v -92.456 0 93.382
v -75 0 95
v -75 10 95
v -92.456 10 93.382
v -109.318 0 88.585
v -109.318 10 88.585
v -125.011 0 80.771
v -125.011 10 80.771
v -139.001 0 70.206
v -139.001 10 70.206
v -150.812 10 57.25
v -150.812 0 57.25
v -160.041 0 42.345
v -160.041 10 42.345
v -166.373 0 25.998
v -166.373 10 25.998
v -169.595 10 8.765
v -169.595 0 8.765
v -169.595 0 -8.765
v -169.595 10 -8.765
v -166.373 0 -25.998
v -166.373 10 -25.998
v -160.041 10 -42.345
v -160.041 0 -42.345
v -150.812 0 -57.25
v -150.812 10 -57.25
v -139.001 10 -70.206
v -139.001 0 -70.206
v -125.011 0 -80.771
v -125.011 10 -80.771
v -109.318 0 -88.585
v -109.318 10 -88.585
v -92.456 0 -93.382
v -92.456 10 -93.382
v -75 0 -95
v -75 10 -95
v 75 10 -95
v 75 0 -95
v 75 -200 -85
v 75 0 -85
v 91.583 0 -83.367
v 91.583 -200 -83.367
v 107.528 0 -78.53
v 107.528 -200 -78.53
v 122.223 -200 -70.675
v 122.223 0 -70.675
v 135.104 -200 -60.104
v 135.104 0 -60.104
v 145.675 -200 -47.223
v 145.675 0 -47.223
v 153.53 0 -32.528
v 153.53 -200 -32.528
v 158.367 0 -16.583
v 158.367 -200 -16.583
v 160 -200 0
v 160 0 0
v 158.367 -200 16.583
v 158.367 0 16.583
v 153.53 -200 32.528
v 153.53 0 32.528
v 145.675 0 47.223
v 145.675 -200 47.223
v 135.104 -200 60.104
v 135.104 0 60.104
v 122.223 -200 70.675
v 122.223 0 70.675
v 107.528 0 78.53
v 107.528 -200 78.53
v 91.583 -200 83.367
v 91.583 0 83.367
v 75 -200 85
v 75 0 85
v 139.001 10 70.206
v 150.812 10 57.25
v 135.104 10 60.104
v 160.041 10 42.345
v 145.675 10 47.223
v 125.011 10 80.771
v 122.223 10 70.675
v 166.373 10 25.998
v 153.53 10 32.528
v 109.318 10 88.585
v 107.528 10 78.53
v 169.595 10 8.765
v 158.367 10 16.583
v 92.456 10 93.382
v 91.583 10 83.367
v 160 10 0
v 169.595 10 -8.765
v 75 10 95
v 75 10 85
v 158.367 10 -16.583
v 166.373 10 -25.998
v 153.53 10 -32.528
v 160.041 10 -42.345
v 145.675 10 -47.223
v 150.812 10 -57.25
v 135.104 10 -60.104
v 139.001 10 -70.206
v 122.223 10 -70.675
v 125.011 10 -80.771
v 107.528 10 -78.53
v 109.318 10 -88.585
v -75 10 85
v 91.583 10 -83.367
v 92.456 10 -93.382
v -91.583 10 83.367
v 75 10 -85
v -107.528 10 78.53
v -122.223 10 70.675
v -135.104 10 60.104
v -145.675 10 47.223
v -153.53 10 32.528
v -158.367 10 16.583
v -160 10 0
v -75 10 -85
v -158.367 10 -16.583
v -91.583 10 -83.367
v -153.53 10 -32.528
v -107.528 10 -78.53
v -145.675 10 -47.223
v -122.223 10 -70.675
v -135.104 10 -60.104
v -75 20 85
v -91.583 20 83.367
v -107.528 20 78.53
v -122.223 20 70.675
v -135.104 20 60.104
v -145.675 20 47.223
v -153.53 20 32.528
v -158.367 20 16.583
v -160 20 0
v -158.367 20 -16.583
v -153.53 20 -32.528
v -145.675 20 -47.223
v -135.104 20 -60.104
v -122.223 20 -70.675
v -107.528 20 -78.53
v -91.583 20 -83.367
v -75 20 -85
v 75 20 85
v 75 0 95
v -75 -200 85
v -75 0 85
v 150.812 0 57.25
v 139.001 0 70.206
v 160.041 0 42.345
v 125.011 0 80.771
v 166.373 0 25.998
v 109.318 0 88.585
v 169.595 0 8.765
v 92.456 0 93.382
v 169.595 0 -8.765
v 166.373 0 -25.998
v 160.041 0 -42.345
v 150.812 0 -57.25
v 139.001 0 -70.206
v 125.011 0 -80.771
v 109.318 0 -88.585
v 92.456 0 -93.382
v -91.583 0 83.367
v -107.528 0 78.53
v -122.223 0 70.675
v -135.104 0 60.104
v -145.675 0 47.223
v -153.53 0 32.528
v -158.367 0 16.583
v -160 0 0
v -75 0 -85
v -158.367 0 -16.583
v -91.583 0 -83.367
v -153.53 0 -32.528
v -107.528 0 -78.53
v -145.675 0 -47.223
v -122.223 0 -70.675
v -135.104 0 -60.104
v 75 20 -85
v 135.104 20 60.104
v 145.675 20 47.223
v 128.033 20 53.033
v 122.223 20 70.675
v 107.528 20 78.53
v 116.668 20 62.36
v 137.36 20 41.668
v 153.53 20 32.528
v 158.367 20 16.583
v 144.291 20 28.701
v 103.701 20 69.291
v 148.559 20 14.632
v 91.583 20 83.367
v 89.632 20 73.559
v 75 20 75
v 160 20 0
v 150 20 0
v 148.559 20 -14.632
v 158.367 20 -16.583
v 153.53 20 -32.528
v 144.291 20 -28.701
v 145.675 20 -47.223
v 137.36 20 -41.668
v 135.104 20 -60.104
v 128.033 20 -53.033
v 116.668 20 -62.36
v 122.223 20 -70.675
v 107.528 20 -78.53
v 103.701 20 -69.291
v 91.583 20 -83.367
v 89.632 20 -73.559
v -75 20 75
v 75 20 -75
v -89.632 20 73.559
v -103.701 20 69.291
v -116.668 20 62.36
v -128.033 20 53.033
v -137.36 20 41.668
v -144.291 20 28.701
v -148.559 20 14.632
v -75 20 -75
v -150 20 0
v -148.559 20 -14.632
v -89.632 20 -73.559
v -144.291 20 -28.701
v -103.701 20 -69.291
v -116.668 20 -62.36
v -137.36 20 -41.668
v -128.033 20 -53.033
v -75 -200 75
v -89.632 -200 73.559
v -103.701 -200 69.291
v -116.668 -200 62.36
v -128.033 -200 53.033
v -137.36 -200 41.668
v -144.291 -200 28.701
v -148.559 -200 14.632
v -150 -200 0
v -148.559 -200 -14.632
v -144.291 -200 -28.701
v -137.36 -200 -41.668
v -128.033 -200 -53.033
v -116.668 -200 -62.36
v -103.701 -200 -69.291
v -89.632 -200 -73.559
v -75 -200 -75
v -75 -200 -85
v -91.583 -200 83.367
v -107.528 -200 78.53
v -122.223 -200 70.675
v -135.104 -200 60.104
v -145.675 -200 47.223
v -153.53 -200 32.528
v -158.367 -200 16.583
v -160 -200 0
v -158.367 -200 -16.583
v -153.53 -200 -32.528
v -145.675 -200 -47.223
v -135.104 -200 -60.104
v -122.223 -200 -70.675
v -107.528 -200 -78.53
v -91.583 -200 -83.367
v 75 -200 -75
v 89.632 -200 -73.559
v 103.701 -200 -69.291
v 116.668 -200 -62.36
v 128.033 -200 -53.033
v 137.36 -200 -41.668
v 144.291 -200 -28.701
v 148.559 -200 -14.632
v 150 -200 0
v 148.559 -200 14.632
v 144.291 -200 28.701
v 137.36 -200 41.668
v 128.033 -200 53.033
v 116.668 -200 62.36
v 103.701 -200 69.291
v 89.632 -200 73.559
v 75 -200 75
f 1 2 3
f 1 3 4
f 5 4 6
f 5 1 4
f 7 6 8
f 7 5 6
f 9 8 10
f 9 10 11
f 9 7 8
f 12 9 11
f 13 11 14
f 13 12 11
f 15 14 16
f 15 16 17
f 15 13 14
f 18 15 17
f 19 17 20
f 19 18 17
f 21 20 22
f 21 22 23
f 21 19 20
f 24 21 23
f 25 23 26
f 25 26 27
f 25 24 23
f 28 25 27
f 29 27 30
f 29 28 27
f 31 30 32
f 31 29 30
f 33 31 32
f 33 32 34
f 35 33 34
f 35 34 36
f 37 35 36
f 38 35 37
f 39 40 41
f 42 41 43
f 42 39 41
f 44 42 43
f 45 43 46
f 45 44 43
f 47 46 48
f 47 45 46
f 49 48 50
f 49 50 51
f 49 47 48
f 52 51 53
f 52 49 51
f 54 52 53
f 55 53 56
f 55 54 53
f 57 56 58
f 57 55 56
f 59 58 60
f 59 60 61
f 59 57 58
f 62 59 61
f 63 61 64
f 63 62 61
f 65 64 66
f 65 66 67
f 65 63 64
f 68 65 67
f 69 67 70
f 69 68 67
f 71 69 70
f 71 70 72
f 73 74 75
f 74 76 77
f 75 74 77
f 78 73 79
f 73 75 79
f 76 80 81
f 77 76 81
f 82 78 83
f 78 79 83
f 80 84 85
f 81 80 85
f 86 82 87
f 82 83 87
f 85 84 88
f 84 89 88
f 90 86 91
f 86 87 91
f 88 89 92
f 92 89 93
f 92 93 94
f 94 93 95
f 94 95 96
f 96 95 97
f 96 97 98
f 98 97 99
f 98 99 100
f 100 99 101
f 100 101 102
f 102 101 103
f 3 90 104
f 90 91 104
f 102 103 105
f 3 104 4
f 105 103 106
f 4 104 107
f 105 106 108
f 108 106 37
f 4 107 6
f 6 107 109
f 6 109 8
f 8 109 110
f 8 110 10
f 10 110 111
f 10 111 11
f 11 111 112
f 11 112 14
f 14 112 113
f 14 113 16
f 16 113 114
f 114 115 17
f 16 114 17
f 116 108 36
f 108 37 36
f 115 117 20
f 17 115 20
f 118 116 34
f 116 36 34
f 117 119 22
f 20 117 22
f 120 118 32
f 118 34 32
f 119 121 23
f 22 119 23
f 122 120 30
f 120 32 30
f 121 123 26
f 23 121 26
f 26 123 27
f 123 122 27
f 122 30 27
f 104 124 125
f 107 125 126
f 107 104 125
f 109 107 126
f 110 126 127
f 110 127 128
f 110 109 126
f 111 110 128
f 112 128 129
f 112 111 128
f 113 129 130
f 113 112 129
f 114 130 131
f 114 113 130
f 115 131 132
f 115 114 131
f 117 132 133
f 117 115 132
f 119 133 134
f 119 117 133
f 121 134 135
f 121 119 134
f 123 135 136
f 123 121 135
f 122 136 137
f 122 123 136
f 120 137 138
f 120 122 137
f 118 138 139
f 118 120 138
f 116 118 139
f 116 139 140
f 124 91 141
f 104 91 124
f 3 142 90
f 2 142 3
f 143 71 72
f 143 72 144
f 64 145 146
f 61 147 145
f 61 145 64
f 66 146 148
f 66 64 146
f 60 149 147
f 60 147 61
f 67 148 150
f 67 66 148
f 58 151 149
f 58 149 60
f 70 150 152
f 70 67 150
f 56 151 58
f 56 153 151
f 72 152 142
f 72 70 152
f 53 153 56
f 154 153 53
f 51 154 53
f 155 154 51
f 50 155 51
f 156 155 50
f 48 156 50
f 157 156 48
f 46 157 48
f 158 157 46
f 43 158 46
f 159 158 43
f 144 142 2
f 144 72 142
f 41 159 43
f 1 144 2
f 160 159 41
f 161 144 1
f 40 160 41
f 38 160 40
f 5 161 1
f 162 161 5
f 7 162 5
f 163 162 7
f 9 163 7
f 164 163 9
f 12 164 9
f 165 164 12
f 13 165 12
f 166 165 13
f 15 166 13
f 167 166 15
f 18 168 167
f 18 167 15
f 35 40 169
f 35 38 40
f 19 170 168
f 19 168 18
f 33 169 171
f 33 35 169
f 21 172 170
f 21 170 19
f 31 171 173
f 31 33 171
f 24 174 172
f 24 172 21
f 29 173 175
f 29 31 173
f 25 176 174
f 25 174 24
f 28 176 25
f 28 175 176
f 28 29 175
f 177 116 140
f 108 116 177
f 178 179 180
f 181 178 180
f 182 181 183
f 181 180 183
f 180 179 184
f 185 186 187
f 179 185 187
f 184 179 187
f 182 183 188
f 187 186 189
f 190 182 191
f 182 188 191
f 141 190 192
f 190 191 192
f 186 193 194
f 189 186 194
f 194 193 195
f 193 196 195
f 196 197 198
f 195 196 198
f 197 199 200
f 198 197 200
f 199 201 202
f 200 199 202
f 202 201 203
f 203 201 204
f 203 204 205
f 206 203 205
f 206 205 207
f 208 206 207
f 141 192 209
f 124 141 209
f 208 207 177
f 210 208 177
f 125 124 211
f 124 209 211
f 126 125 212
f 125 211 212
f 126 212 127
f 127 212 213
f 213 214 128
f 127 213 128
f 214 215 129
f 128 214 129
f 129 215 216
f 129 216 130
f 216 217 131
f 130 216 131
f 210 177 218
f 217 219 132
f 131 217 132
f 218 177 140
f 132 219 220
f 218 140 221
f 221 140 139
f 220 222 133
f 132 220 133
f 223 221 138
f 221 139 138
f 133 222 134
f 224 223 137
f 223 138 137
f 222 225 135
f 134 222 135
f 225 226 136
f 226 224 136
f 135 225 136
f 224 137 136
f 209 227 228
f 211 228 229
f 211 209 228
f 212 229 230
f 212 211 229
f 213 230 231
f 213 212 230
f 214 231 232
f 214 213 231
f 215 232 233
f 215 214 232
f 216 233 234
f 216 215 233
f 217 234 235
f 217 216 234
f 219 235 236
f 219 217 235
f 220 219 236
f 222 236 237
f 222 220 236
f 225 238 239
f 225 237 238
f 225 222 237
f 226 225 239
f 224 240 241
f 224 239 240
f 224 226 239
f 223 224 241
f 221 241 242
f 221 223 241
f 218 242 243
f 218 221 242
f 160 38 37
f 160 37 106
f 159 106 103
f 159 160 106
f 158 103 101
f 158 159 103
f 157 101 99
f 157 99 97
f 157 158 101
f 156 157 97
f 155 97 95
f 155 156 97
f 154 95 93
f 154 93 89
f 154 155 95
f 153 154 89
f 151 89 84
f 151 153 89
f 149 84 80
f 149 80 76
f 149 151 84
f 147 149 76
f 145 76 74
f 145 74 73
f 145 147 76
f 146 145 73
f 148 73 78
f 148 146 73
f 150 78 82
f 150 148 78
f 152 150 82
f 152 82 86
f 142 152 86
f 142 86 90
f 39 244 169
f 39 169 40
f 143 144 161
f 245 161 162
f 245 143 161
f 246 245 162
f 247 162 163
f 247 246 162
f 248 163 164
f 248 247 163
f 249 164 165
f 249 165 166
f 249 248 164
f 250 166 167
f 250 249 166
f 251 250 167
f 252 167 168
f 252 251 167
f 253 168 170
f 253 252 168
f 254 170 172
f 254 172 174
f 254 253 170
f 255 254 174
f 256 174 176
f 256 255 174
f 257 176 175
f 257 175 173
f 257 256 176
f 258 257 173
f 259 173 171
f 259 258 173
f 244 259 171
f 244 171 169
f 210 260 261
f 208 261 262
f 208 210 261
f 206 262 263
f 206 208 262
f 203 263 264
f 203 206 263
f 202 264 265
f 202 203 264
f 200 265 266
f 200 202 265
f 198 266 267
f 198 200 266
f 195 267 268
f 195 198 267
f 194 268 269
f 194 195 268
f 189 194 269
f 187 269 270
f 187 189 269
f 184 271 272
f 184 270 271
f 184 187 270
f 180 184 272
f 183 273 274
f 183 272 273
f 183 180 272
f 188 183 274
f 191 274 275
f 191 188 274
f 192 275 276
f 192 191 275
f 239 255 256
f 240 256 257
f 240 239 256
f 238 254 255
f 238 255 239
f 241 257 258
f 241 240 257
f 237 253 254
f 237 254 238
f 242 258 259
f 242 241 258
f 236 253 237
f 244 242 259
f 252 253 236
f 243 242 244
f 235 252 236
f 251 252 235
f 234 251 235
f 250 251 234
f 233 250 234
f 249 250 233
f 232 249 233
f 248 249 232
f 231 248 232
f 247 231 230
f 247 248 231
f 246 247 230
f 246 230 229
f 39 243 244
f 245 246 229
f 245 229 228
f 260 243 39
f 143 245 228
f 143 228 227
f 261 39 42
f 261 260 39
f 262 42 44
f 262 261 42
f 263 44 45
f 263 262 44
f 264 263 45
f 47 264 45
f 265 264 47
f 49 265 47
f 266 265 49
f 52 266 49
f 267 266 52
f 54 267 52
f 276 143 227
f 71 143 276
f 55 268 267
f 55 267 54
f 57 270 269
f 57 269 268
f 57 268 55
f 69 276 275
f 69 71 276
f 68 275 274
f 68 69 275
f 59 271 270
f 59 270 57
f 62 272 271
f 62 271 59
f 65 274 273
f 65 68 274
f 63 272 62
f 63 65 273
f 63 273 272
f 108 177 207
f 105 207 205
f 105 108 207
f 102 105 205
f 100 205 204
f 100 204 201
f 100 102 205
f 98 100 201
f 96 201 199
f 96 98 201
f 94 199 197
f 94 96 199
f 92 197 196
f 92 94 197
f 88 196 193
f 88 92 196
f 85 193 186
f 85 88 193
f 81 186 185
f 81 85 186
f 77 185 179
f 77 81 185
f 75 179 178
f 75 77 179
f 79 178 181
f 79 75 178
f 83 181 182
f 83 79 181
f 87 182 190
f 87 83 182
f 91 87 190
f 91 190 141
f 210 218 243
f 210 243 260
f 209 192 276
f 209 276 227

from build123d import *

# Parameters (mm, degrees)
EXTRUDE_1_DEPTH     = 10
EXTRUDE_2_DEPTH     = 10
EXTRUDE_START       = 200
EXTRUDE_3_DEPTH     = 200
CUT_EXTRUDE_1_DEPTH = 294.811163845


with BuildPart() as part:
    # 草图1 → 凸台-拉伸1 (new body)
    with BuildSketch(Plane(origin=(0, 0, 0), x_dir=(1, 0, 0), z_dir=(0, 1, 0))):
        with BuildLine():
            Line((-75, 95), (75, 95))
            ThreePointArc((75, 95), (170, 0), (75, -95))
            Line((75, -95), (-75, -95))
            ThreePointArc((-75, -95), (-170, 0), (-75, 95))
        make_face()
    extrude(amount=EXTRUDE_1_DEPTH)

    # 草图2 → 凸台-拉伸2 (add)
    with BuildSketch(Plane(origin=(0, 10, 0), x_dir=(1, 0, 0), z_dir=(0, 1, 0))):
        with BuildLine():
            Line((-75, 85), (75, 85))
            ThreePointArc((75, 85), (160, 0), (75, -85))
            Line((75, -85), (-75, -85))
            ThreePointArc((-75, -85), (-160, 0), (-75, 85))
        make_face()
    extrude(amount=EXTRUDE_2_DEPTH)

    # 草图3 → 凸台-拉伸3 (add)
    with BuildSketch(Plane.XZ.offset(EXTRUDE_START)):
        with BuildLine():
            Line((-75, -85), (75, -85))
            ThreePointArc((75, -85), (160, 0), (75, 85))
            Line((75, 85), (-75, 85))
            ThreePointArc((-75, 85), (-160, 0), (-75, -85))
        make_face()
    extrude(amount=-EXTRUDE_3_DEPTH)

    # 草图4 → 切除-拉伸1 (cut, through all)
    with BuildSketch(Plane(origin=(0, 20, 0), x_dir=(1, 0, 0), z_dir=(0, 1, 0))):
        with BuildLine():
            Line((-75, 75), (75, 75))
            ThreePointArc((75, 75), (150, 0), (75, -75))
            Line((75, -75), (-75, -75))
            ThreePointArc((-75, -75), (-150, 0), (-75, 75))
        make_face()
    extrude(amount=-CUT_EXTRUDE_1_DEPTH, mode=Mode.SUBTRACT)


solid = part.part
